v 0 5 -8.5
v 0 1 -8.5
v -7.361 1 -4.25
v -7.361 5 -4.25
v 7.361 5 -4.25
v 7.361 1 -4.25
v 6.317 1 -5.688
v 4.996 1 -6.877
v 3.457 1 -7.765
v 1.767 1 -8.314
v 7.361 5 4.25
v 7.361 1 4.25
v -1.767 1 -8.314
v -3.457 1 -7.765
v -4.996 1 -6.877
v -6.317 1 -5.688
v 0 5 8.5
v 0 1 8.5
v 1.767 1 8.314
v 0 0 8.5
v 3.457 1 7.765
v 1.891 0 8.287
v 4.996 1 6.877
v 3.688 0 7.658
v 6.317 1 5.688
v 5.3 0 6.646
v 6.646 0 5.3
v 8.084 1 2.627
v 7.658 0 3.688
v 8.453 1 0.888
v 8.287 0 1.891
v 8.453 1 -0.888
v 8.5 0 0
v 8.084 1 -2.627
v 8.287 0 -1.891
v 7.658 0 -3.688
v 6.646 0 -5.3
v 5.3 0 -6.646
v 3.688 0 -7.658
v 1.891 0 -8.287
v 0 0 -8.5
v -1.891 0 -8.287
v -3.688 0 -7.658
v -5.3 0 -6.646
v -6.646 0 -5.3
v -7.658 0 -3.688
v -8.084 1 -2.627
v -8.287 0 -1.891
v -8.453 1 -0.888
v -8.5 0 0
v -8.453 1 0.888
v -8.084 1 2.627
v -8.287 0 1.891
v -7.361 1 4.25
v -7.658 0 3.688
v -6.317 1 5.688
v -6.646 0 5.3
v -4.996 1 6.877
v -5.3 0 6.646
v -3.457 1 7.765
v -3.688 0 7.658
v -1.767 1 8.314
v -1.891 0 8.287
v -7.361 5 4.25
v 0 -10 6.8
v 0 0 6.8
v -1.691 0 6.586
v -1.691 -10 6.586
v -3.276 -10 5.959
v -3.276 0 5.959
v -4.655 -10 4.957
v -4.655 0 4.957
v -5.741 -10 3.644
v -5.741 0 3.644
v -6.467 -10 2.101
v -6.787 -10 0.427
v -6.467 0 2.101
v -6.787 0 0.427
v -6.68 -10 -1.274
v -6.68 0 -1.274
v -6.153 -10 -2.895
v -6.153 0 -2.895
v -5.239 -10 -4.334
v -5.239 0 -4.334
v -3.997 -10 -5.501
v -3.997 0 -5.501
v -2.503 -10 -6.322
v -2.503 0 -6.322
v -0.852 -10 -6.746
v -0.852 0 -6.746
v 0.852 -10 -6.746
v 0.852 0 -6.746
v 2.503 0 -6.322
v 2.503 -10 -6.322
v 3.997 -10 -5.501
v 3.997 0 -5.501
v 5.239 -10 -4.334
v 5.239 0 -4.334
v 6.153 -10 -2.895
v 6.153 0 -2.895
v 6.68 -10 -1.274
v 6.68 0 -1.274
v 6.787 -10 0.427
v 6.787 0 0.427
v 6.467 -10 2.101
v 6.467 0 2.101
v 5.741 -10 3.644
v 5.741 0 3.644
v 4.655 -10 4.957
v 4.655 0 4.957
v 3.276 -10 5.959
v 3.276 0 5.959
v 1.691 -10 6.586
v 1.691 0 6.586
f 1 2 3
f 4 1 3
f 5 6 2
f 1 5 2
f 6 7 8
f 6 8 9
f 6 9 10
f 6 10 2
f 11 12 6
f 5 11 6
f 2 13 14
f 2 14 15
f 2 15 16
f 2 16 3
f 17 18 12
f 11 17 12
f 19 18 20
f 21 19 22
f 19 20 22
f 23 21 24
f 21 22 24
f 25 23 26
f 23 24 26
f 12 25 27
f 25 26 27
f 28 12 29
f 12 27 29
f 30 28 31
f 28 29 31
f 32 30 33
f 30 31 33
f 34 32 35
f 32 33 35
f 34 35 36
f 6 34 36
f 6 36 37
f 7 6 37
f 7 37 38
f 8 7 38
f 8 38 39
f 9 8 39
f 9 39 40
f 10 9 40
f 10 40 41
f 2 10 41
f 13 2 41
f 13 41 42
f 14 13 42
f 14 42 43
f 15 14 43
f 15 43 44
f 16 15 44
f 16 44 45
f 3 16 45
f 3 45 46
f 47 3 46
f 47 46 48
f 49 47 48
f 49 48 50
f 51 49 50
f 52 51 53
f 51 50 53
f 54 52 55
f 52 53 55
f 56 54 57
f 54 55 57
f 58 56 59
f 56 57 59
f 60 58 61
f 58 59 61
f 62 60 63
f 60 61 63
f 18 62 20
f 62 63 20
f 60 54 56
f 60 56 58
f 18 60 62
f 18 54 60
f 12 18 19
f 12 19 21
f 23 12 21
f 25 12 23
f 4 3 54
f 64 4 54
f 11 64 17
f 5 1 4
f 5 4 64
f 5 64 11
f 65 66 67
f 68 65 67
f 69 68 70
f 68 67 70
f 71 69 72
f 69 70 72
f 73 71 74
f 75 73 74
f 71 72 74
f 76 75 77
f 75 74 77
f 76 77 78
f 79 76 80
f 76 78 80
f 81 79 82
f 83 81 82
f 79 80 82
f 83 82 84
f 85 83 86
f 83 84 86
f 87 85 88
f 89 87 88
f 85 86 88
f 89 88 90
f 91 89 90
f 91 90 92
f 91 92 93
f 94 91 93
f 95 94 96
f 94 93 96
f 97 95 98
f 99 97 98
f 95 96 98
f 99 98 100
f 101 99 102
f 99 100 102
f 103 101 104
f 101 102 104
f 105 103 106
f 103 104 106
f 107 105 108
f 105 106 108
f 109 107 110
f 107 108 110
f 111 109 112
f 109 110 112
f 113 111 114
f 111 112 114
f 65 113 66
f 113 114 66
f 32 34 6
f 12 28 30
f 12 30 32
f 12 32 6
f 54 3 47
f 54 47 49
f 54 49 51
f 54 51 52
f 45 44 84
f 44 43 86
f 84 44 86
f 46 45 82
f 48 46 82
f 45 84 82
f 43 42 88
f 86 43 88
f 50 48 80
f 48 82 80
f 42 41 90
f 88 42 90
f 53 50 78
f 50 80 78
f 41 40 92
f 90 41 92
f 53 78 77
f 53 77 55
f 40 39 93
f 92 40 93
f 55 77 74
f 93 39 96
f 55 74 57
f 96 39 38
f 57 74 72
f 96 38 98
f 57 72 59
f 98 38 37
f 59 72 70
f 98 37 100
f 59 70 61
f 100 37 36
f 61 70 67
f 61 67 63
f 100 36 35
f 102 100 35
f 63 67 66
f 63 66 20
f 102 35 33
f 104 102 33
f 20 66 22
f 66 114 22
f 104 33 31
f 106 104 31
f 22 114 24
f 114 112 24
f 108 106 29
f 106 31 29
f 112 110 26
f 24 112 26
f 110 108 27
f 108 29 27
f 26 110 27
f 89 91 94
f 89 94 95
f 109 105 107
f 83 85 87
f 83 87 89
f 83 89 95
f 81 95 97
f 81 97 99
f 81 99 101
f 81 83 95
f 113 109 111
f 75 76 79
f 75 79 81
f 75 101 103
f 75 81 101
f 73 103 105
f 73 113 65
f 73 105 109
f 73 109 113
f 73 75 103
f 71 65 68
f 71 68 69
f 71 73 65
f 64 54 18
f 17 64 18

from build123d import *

# Parameters (mm, degrees)
SKETCH1_R      = 8.5
EXTRUDE1_DEPTH = 1
EXTRUDE2_DEPTH = 4
SKETCH3_R      = 6.8
EXTRUDE3_DEPTH = 10


with BuildPart() as part:
    # Sketch1 → Extrude1 (new body)
    with BuildSketch(Plane(origin=(0, 0, 0), x_dir=(1, 0, 0), z_dir=(0, 1, 0))):
        with Locations(Location((0, 0, 0), (0, 0, 270))):
            Circle(SKETCH1_R)
    extrude(amount=EXTRUDE1_DEPTH)

    # Sketch2 → Extrude2 (add)
    with BuildSketch(Plane(origin=(0, 1, 0), x_dir=(1, 0, 0), z_dir=(0, 1, 0))):
        Polygon((0, 8.5), (-7.361215932, 4.25), (-7.361215932, -4.25), (0, -8.5), (7.361215932, -4.25), (7.361215932, 4.25), align=None)
    extrude(amount=EXTRUDE2_DEPTH)

    # Sketch3 → Extrude3 (add)
    with BuildSketch(Plane.XZ):
        with Locations(Location((0, 0, 0), (0, 0, 90))):
            Circle(SKETCH3_R)
    extrude(amount=EXTRUDE3_DEPTH)


solid = part.part
